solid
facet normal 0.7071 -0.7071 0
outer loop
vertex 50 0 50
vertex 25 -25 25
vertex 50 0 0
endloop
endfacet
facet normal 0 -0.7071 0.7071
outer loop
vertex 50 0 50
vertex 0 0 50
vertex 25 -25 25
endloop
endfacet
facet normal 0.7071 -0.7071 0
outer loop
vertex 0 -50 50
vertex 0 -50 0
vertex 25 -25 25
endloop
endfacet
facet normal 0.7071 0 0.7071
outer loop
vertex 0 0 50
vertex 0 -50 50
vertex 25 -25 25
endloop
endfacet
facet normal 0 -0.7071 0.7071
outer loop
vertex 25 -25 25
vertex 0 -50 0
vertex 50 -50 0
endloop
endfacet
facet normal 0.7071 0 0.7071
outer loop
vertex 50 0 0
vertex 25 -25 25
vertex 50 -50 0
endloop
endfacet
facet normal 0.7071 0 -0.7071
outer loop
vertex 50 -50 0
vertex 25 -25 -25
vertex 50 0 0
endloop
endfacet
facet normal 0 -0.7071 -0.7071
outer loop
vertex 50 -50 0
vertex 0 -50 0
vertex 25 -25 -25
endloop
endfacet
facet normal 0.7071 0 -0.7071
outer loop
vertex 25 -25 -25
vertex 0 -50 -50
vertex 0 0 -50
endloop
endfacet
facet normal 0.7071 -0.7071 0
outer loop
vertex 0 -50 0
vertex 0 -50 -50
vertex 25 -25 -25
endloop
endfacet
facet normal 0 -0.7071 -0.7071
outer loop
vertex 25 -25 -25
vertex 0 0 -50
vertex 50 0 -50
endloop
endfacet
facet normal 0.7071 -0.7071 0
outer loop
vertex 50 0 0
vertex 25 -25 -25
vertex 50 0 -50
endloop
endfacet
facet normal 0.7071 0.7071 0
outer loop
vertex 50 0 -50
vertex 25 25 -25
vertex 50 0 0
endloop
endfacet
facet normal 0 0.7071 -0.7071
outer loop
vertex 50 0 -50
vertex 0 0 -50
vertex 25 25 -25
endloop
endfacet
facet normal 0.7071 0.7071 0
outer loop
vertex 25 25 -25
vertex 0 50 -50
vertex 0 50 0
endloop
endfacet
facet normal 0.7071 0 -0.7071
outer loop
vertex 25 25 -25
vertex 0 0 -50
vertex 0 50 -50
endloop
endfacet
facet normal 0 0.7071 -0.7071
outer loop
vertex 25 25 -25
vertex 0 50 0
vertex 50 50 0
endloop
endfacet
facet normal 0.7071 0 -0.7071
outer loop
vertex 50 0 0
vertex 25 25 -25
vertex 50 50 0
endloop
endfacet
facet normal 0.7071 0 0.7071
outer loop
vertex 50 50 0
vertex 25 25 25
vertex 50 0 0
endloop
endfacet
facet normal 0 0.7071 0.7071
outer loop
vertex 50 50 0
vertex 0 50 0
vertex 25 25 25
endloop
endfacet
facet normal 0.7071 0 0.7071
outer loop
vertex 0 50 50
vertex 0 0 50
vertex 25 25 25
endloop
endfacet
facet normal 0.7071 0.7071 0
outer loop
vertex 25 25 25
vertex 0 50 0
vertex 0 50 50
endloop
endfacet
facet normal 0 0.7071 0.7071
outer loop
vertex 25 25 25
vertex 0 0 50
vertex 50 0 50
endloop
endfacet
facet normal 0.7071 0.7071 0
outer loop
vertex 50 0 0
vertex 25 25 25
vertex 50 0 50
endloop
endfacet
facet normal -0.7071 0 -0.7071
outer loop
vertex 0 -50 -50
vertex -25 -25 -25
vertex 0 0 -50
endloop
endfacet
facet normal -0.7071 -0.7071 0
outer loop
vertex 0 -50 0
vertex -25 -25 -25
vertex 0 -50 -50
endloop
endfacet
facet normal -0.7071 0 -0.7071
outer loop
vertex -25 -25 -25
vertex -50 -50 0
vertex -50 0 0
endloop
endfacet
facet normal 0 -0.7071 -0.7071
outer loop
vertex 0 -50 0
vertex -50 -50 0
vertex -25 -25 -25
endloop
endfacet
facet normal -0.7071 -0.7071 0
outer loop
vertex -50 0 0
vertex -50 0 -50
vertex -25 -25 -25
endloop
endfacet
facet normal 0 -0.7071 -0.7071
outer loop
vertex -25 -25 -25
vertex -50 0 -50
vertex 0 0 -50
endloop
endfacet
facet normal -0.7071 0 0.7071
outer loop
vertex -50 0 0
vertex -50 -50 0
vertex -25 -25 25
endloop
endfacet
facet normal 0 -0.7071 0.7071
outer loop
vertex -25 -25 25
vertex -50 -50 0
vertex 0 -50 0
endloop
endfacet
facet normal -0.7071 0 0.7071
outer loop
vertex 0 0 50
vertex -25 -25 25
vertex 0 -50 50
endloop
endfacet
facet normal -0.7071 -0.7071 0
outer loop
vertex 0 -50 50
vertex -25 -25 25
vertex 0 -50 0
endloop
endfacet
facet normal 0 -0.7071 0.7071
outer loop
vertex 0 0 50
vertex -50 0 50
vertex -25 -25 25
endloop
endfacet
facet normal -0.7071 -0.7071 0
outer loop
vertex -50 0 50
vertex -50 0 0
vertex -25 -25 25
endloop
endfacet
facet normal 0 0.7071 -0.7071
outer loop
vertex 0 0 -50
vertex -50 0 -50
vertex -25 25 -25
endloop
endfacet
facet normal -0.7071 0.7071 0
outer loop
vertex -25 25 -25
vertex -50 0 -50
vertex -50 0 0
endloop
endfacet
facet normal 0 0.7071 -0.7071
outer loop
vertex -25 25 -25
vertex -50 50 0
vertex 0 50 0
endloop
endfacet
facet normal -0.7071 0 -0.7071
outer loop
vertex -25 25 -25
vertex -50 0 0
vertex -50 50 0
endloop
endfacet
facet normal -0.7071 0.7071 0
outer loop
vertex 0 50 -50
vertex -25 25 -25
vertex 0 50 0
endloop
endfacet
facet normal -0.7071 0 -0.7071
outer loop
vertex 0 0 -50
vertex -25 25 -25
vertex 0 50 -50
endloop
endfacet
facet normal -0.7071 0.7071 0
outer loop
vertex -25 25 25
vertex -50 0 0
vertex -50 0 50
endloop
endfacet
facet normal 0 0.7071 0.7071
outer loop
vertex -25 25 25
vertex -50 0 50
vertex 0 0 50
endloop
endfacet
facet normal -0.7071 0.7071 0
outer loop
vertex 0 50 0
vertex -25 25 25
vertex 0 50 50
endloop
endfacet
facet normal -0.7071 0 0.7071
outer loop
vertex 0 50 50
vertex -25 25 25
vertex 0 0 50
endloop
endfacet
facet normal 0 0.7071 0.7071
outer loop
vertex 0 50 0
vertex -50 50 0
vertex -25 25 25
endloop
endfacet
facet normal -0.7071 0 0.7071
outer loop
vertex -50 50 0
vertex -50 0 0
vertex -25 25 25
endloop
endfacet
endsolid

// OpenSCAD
size = 50;

translate([0,-size,0]) half_cube(size);
rotate([90,0,0]) translate([0,-size,0]) half_cube(size);
rotate([180,0,0]) translate([0,-size,0]) half_cube(size);
rotate([-90,0,0]) translate([0,-size,0]) half_cube(size);

rotate([90,90,0]) translate([0,-size,0]) half_cube(size);
rotate([90,180,0]) translate([0,-size,0]) half_cube(size);
rotate([180,90,0]) translate([0,-size,0]) half_cube(size);
rotate([180,180,0]) translate([0,-size,0]) half_cube(size);


module half_cube(size) {
    translate([0,size,0]) rotate([90,0,0]) cube_piece(size);
    translate([0,0,size]) rotate([0,90,0]) cube_piece(size);
    rotate([0,0,0]) cube_piece(size);
}
module cube_piece(size) {
polyhedron(
    [
        [0,0,0],
        [size,0,0],
        [0,size,0],
        [size,size,0],
        [size/2,size/2,size/2]
    ],
    [
        [0,2,3,1],
        [0,1,4],
        [1,3,4],
        [3,2,4],
        [2,0,4],
    ],
    1
);
}
